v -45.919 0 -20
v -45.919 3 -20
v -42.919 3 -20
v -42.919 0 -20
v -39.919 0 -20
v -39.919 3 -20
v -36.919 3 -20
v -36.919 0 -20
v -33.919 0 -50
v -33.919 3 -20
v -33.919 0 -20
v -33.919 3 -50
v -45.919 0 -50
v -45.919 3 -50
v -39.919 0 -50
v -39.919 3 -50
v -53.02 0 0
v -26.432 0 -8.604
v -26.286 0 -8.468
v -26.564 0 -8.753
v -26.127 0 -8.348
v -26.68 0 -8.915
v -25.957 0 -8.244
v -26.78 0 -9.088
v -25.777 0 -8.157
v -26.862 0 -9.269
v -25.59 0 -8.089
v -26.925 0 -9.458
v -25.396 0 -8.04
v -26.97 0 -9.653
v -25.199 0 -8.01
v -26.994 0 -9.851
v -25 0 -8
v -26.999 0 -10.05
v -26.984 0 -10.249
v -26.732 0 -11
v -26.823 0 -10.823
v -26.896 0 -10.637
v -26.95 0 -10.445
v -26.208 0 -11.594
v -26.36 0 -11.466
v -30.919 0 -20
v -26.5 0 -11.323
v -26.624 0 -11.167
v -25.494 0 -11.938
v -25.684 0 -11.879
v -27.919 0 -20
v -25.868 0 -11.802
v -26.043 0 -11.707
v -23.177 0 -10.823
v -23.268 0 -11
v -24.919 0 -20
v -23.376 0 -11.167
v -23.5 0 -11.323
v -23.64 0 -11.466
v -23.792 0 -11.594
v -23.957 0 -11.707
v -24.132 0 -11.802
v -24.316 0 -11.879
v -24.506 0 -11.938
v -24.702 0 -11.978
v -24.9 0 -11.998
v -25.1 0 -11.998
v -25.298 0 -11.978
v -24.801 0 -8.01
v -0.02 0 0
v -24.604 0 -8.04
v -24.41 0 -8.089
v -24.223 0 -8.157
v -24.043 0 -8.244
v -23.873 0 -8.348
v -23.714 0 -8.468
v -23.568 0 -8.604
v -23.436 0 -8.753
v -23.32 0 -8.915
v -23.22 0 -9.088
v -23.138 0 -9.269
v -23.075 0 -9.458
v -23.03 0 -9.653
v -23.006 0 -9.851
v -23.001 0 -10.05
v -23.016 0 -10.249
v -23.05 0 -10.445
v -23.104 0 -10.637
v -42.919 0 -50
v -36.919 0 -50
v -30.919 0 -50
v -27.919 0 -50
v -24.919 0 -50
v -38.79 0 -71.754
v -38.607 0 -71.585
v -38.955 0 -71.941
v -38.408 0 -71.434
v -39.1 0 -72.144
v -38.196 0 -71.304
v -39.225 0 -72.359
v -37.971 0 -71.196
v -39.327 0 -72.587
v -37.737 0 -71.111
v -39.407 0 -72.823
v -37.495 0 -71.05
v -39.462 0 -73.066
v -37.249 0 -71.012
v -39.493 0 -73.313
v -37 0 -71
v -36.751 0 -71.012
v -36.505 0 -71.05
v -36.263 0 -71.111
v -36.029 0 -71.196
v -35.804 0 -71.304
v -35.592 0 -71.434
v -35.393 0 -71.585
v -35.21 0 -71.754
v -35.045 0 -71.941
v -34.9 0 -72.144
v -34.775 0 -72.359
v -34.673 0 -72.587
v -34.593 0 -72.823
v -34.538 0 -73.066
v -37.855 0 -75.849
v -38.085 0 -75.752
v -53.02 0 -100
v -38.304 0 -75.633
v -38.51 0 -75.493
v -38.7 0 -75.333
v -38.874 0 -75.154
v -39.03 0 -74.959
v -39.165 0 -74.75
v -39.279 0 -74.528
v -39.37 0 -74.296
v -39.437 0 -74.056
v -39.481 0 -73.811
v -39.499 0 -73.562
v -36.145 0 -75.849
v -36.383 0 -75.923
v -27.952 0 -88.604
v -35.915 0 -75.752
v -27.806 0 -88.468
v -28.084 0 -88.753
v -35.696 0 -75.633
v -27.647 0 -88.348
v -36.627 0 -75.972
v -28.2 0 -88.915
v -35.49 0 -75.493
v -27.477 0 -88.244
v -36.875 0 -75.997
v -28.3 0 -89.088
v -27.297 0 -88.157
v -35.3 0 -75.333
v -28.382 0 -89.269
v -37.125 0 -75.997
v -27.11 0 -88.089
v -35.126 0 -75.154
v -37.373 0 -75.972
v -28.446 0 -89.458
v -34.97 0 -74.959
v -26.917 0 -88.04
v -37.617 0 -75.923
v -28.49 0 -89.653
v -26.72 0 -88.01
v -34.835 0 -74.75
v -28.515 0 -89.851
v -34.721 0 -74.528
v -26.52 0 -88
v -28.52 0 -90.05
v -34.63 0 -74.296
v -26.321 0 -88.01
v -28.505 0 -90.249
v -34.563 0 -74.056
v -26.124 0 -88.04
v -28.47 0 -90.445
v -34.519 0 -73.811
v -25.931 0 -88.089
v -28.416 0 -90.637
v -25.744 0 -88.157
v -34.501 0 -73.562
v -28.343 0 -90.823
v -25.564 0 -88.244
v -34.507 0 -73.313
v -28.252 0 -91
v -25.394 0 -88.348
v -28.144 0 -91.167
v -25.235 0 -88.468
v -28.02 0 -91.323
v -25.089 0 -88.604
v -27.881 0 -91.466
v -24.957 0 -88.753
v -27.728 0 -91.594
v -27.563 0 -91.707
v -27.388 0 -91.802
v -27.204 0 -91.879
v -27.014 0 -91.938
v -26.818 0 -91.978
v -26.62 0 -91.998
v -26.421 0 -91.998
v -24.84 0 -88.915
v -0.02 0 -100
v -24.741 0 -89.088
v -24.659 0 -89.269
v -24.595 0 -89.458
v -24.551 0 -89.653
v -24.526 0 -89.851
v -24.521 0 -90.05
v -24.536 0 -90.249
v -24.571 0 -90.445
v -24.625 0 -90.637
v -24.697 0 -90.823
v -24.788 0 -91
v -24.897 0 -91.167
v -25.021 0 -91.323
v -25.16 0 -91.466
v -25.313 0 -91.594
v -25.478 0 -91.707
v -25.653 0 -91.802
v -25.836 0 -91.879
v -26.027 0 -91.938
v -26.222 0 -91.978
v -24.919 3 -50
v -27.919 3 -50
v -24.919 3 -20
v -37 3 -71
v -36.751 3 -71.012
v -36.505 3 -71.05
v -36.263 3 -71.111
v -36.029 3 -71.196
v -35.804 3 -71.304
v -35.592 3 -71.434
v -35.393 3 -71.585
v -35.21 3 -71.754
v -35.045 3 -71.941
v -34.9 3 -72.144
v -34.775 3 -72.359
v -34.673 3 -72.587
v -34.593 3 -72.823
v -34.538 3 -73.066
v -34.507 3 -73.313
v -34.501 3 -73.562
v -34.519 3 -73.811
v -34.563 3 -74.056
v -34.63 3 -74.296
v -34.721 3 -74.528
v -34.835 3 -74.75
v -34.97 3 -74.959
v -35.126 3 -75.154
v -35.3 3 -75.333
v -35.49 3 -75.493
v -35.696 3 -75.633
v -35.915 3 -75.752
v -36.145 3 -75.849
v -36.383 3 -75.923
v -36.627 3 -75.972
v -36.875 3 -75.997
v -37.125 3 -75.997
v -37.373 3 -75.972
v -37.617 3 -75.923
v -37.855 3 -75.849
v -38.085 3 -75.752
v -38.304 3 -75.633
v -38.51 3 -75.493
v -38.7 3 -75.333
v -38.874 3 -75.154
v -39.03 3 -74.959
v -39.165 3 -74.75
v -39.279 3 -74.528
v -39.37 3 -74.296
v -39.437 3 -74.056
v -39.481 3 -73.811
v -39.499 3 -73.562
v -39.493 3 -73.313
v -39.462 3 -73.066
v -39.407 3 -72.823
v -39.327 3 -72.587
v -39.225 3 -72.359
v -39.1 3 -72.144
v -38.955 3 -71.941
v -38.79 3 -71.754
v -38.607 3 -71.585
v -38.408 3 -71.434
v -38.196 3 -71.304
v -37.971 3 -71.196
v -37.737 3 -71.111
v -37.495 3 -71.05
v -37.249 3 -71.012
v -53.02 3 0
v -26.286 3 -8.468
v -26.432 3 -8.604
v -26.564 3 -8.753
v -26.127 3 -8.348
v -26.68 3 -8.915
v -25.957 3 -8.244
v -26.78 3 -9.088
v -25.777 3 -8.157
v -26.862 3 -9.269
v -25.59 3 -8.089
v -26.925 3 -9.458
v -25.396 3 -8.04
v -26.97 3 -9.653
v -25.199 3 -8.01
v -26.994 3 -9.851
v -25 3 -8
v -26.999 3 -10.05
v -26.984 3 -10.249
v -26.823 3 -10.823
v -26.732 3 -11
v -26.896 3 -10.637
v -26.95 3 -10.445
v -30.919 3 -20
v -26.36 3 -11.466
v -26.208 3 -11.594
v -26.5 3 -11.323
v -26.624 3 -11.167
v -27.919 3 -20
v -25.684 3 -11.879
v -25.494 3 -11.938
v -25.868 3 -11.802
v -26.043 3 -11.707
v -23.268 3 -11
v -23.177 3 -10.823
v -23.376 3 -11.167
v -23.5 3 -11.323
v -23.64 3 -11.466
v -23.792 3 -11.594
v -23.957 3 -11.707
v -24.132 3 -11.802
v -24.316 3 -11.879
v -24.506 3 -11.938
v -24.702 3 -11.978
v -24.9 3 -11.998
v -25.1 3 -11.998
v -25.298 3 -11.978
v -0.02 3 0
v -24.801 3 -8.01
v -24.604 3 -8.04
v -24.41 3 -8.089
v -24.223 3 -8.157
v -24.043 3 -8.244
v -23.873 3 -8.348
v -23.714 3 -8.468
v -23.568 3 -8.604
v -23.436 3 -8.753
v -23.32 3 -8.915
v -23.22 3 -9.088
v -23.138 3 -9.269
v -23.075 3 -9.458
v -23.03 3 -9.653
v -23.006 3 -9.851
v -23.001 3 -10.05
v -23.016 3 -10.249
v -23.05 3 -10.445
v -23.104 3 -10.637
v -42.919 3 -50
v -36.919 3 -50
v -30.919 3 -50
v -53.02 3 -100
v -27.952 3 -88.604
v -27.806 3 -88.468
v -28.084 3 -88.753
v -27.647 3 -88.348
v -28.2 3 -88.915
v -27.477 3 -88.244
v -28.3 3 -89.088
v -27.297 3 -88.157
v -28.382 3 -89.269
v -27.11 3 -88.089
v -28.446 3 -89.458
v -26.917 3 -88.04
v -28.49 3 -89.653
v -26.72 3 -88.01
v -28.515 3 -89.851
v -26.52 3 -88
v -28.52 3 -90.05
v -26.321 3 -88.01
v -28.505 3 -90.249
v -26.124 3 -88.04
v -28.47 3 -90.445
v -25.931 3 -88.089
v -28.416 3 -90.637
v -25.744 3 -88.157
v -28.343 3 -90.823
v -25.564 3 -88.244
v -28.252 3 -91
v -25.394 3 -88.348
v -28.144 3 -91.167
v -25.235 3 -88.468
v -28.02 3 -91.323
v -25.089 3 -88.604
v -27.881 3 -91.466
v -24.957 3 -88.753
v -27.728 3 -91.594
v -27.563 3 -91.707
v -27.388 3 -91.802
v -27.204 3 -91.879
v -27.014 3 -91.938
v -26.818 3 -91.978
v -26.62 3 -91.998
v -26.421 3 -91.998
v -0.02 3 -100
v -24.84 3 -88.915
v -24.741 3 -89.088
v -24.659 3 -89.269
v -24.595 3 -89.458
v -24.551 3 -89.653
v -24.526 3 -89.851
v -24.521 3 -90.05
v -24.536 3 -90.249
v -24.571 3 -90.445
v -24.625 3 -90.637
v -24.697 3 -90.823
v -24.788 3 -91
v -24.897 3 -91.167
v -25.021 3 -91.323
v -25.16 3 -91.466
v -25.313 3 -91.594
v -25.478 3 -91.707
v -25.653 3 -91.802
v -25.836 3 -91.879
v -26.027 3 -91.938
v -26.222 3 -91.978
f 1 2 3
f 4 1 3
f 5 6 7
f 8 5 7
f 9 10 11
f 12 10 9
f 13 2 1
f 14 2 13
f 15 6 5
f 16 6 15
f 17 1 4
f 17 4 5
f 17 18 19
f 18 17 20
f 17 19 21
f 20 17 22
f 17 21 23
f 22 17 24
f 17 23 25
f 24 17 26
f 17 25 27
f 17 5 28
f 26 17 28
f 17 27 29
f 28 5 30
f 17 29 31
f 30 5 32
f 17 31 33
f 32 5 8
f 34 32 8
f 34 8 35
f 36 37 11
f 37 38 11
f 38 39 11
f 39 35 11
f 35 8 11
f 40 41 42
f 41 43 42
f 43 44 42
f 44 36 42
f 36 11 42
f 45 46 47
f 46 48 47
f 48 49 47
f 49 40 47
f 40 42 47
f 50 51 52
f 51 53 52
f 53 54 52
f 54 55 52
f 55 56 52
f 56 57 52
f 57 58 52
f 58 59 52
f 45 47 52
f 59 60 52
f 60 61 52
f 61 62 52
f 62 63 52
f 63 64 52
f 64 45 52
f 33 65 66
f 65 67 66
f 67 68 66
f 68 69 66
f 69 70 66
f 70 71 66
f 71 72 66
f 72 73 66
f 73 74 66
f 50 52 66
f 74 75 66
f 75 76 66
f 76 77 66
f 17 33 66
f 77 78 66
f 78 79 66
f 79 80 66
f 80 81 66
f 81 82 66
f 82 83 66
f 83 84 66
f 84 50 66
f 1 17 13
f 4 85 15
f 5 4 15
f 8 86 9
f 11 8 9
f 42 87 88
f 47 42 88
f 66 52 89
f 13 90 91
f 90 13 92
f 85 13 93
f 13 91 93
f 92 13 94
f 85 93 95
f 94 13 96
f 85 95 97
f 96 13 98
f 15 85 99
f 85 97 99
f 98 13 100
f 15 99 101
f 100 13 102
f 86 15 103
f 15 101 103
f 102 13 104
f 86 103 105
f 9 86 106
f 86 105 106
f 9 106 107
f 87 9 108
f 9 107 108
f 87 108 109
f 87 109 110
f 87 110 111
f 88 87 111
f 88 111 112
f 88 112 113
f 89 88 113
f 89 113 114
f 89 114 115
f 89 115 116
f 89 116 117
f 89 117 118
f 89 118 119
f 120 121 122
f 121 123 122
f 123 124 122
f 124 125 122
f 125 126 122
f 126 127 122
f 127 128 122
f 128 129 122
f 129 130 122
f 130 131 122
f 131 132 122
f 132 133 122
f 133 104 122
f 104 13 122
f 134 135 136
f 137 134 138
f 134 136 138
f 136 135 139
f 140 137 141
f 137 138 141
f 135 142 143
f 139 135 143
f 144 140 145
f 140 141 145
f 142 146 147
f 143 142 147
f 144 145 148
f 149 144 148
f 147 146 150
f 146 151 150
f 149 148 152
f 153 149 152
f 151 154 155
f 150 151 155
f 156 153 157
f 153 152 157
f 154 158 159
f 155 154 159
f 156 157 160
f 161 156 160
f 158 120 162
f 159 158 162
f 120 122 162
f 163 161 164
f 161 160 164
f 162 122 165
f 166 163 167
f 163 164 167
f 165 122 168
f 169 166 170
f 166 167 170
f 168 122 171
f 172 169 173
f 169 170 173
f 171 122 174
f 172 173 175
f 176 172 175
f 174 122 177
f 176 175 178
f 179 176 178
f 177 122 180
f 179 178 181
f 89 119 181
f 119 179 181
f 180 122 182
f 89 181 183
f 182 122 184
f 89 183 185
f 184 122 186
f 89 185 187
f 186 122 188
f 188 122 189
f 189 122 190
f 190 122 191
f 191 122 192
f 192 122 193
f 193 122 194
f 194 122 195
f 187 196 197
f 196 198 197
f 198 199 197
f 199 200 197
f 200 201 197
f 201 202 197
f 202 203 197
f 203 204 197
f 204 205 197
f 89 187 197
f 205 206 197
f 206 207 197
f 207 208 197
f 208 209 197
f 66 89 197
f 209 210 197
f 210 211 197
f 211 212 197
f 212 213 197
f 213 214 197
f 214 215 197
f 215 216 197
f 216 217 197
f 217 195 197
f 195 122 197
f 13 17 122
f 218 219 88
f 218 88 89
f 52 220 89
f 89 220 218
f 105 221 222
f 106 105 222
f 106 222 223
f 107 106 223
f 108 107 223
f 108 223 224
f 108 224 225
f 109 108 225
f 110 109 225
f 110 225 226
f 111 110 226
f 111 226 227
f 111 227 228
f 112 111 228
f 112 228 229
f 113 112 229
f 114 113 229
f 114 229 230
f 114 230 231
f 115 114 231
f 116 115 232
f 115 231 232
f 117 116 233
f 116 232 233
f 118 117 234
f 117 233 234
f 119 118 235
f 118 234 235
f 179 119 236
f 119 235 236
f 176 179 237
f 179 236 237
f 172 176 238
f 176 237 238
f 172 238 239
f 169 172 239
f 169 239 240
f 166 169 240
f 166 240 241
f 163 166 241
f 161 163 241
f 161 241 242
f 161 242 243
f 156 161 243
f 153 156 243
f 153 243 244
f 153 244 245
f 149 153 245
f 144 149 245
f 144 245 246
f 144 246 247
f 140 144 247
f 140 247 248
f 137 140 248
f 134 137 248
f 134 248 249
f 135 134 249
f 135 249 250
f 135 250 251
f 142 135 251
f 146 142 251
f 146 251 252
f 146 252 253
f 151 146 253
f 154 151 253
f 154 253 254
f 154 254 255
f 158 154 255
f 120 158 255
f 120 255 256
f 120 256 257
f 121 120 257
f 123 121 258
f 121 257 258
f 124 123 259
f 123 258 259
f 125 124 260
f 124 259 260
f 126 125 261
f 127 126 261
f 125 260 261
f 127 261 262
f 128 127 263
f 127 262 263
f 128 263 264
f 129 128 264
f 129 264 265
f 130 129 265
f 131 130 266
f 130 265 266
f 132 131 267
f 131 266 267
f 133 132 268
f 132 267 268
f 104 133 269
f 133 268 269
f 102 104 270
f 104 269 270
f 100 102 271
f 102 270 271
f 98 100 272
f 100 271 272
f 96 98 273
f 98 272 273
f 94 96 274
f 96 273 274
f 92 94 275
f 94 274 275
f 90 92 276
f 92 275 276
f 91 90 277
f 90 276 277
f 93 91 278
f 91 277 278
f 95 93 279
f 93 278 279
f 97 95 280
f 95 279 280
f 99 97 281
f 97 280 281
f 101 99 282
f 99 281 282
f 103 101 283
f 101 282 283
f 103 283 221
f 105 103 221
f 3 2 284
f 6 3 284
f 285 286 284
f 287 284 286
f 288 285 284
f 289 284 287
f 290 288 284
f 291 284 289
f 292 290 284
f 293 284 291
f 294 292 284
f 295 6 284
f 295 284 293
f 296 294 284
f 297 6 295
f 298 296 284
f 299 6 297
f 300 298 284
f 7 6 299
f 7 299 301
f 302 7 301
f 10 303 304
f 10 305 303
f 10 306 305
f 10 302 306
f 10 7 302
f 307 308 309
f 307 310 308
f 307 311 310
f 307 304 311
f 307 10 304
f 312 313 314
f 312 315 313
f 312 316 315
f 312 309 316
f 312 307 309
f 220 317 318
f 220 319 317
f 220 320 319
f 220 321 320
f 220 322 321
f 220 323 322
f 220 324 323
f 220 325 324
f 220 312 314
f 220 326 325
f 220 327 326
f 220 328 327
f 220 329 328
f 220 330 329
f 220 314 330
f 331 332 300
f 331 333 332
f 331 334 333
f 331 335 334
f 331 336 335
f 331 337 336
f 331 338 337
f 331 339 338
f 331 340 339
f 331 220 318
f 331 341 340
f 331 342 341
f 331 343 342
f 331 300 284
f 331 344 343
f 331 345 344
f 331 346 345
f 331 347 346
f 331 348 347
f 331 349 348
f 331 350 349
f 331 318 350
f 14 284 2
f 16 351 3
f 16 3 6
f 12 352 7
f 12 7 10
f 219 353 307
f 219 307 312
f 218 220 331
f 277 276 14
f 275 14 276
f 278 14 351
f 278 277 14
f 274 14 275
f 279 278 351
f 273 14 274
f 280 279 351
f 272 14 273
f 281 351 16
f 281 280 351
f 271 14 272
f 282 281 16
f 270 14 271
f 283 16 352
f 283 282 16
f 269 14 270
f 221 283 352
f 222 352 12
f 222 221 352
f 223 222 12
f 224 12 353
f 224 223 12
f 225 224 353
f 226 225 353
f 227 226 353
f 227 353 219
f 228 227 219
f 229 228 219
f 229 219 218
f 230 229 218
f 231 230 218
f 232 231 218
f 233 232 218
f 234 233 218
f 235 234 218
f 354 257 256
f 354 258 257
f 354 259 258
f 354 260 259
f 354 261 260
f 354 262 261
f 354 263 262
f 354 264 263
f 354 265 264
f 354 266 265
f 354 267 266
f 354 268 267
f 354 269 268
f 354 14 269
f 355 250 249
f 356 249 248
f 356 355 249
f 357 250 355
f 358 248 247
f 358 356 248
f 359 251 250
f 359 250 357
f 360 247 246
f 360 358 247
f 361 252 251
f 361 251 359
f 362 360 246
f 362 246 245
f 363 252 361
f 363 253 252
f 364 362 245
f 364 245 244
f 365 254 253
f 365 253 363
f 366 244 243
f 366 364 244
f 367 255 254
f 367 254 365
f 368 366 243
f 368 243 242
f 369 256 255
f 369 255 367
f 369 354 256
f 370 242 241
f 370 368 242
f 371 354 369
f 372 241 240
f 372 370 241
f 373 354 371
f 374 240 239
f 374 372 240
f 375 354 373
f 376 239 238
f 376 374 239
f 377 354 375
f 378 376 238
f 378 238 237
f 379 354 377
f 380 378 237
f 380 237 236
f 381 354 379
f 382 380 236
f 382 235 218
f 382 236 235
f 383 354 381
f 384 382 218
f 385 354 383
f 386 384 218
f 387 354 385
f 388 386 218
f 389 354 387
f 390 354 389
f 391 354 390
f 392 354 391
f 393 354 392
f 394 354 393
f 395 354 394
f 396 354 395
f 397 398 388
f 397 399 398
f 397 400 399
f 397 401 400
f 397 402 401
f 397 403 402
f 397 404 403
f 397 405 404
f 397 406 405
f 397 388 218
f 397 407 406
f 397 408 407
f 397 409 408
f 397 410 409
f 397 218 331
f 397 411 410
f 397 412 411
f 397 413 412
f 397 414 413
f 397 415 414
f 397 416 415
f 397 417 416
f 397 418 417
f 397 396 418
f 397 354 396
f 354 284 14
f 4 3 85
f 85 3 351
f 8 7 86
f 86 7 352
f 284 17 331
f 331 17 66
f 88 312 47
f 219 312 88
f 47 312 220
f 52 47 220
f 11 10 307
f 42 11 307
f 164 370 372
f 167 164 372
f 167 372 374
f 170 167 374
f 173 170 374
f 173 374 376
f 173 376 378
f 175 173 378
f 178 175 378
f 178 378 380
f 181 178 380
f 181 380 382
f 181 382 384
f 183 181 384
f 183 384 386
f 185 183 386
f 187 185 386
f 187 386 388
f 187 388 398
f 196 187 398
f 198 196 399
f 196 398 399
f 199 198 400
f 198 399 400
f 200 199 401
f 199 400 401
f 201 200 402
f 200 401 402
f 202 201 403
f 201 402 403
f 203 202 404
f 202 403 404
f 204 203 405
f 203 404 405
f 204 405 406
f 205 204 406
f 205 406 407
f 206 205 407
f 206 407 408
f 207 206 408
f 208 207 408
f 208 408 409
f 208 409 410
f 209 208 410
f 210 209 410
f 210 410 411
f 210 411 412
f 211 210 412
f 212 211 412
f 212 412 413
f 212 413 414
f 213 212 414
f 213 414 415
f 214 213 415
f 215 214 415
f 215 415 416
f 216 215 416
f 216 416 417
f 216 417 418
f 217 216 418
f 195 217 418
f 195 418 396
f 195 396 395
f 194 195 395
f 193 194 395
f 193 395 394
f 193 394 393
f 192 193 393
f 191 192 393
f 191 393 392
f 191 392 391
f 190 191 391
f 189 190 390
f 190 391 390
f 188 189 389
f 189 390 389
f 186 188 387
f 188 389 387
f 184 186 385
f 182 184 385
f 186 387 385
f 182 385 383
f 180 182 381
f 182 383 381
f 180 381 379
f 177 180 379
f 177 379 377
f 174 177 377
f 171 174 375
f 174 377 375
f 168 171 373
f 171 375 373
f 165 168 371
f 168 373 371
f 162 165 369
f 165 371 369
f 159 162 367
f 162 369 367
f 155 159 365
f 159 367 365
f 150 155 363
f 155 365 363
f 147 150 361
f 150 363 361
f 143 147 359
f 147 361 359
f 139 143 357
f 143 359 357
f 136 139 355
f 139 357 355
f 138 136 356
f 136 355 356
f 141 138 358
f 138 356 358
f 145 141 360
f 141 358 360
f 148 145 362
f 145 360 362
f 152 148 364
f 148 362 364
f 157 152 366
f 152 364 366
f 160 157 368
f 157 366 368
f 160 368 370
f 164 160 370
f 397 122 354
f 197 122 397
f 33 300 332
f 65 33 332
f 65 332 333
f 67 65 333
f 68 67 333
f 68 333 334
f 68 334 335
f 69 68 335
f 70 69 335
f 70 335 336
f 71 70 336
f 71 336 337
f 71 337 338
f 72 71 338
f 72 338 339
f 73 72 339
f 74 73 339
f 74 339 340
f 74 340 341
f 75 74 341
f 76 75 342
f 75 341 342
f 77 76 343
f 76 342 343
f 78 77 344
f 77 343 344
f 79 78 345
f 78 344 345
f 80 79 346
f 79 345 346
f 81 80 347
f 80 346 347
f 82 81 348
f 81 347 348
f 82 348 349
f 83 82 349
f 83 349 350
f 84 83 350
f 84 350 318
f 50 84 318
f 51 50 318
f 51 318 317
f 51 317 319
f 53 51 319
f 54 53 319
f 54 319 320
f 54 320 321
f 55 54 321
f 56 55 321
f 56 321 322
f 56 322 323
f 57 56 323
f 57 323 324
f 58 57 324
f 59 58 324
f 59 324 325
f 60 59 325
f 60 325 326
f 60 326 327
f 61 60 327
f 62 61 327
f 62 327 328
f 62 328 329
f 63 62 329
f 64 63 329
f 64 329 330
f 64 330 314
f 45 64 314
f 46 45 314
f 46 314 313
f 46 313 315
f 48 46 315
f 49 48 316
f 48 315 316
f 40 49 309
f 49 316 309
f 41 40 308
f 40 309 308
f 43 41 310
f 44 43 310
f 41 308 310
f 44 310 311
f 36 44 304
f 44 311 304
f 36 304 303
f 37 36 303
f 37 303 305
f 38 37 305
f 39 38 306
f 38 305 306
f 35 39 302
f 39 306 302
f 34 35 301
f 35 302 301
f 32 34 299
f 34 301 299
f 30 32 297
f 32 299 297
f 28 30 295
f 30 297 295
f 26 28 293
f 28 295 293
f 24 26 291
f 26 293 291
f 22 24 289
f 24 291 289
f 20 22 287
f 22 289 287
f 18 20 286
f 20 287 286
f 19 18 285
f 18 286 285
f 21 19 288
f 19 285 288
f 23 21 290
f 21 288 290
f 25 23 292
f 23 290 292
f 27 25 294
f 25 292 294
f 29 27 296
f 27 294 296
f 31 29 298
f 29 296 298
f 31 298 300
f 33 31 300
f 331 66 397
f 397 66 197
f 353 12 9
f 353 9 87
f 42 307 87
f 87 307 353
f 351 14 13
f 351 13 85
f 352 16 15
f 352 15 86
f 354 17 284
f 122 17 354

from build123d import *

# Parameters (mm, degrees)
ESBO_O2_W                = 53
ESBO_O2_H                = 100
RESSALTO_EXTRUS_O1_DEPTH = 3
ESBO_O3_R                = 2
CORTE_EXTRUS_O1_DEPTH    = 10
ESBO_O4_R                = 2.5
CORTE_EXTRUS_O3_DEPTH    = 10
ESBO_O5_R                = 2
CORTE_EXTRUS_O4_DEPTH    = 10
ESBO_O6_W                = 3
ESBO_O6_H                = 30
CORTE_EXTRUS_O8_DEPTH    = 10


with BuildPart() as part:
    # Esboço2 → Ressalto-extrusão1 (new body)
    with BuildSketch(Plane(origin=(0, 0, 0), x_dir=(1, 0, 0), z_dir=(0, 1, 0))):
        with Locations((-26.520406012, 50)):
            Rectangle(ESBO_O2_W, ESBO_O2_H)
    extrude(amount=RESSALTO_EXTRUS_O1_DEPTH)

    # Esboço3 → Corte-extrusão1 (cut)
    with BuildSketch(Plane(origin=(0, 3, 0), x_dir=(1, 0, 0), z_dir=(0, 1, 0))):
        with Locations(Location((-25, 10, 0), (0, 0, 270))):
            Circle(ESBO_O3_R)
    extrude(amount=-CORTE_EXTRUS_O1_DEPTH, mode=Mode.SUBTRACT)

    # Esboço4 → Corte-extrusão3 (cut)
    with BuildSketch(Plane(origin=(0, 3, 0), x_dir=(1, 0, 0), z_dir=(0, 1, 0))):
        with Locations(Location((-37, 73.5, 0), (0, 0, 270))):
            Circle(ESBO_O4_R)
    extrude(amount=-CORTE_EXTRUS_O3_DEPTH, mode=Mode.SUBTRACT)

    # Esboço5 → Corte-extrusão4 (cut)
    with BuildSketch(Plane(origin=(0, 3, 0), x_dir=(1, 0, 0), z_dir=(0, 1, 0))):
        with Locations(Location((-26.520406012, 90, 0), (0, 0, 270))):
            Circle(ESBO_O5_R)
    extrude(amount=-CORTE_EXTRUS_O4_DEPTH, mode=Mode.SUBTRACT)

    # Esboço6 → Corte-extrusão8 (cut)
    with BuildSketch(Plane(origin=(0, 3, 0), x_dir=(1, 0, 0), z_dir=(0, 1, 0))):
        with Locations((-44.419461936, 35)):
            Rectangle(ESBO_O6_W, ESBO_O6_H)
        with Locations((-38.419461936, 35)):
            Rectangle(ESBO_O6_W, ESBO_O6_H)
        with Locations((-32.419461936, 35)):
            Rectangle(ESBO_O6_W, ESBO_O6_H)
        with Locations((-26.419461936, 35)):
            Rectangle(ESBO_O6_W, ESBO_O6_H)
    extrude(amount=-CORTE_EXTRUS_O8_DEPTH, mode=Mode.SUBTRACT)


solid = part.part
